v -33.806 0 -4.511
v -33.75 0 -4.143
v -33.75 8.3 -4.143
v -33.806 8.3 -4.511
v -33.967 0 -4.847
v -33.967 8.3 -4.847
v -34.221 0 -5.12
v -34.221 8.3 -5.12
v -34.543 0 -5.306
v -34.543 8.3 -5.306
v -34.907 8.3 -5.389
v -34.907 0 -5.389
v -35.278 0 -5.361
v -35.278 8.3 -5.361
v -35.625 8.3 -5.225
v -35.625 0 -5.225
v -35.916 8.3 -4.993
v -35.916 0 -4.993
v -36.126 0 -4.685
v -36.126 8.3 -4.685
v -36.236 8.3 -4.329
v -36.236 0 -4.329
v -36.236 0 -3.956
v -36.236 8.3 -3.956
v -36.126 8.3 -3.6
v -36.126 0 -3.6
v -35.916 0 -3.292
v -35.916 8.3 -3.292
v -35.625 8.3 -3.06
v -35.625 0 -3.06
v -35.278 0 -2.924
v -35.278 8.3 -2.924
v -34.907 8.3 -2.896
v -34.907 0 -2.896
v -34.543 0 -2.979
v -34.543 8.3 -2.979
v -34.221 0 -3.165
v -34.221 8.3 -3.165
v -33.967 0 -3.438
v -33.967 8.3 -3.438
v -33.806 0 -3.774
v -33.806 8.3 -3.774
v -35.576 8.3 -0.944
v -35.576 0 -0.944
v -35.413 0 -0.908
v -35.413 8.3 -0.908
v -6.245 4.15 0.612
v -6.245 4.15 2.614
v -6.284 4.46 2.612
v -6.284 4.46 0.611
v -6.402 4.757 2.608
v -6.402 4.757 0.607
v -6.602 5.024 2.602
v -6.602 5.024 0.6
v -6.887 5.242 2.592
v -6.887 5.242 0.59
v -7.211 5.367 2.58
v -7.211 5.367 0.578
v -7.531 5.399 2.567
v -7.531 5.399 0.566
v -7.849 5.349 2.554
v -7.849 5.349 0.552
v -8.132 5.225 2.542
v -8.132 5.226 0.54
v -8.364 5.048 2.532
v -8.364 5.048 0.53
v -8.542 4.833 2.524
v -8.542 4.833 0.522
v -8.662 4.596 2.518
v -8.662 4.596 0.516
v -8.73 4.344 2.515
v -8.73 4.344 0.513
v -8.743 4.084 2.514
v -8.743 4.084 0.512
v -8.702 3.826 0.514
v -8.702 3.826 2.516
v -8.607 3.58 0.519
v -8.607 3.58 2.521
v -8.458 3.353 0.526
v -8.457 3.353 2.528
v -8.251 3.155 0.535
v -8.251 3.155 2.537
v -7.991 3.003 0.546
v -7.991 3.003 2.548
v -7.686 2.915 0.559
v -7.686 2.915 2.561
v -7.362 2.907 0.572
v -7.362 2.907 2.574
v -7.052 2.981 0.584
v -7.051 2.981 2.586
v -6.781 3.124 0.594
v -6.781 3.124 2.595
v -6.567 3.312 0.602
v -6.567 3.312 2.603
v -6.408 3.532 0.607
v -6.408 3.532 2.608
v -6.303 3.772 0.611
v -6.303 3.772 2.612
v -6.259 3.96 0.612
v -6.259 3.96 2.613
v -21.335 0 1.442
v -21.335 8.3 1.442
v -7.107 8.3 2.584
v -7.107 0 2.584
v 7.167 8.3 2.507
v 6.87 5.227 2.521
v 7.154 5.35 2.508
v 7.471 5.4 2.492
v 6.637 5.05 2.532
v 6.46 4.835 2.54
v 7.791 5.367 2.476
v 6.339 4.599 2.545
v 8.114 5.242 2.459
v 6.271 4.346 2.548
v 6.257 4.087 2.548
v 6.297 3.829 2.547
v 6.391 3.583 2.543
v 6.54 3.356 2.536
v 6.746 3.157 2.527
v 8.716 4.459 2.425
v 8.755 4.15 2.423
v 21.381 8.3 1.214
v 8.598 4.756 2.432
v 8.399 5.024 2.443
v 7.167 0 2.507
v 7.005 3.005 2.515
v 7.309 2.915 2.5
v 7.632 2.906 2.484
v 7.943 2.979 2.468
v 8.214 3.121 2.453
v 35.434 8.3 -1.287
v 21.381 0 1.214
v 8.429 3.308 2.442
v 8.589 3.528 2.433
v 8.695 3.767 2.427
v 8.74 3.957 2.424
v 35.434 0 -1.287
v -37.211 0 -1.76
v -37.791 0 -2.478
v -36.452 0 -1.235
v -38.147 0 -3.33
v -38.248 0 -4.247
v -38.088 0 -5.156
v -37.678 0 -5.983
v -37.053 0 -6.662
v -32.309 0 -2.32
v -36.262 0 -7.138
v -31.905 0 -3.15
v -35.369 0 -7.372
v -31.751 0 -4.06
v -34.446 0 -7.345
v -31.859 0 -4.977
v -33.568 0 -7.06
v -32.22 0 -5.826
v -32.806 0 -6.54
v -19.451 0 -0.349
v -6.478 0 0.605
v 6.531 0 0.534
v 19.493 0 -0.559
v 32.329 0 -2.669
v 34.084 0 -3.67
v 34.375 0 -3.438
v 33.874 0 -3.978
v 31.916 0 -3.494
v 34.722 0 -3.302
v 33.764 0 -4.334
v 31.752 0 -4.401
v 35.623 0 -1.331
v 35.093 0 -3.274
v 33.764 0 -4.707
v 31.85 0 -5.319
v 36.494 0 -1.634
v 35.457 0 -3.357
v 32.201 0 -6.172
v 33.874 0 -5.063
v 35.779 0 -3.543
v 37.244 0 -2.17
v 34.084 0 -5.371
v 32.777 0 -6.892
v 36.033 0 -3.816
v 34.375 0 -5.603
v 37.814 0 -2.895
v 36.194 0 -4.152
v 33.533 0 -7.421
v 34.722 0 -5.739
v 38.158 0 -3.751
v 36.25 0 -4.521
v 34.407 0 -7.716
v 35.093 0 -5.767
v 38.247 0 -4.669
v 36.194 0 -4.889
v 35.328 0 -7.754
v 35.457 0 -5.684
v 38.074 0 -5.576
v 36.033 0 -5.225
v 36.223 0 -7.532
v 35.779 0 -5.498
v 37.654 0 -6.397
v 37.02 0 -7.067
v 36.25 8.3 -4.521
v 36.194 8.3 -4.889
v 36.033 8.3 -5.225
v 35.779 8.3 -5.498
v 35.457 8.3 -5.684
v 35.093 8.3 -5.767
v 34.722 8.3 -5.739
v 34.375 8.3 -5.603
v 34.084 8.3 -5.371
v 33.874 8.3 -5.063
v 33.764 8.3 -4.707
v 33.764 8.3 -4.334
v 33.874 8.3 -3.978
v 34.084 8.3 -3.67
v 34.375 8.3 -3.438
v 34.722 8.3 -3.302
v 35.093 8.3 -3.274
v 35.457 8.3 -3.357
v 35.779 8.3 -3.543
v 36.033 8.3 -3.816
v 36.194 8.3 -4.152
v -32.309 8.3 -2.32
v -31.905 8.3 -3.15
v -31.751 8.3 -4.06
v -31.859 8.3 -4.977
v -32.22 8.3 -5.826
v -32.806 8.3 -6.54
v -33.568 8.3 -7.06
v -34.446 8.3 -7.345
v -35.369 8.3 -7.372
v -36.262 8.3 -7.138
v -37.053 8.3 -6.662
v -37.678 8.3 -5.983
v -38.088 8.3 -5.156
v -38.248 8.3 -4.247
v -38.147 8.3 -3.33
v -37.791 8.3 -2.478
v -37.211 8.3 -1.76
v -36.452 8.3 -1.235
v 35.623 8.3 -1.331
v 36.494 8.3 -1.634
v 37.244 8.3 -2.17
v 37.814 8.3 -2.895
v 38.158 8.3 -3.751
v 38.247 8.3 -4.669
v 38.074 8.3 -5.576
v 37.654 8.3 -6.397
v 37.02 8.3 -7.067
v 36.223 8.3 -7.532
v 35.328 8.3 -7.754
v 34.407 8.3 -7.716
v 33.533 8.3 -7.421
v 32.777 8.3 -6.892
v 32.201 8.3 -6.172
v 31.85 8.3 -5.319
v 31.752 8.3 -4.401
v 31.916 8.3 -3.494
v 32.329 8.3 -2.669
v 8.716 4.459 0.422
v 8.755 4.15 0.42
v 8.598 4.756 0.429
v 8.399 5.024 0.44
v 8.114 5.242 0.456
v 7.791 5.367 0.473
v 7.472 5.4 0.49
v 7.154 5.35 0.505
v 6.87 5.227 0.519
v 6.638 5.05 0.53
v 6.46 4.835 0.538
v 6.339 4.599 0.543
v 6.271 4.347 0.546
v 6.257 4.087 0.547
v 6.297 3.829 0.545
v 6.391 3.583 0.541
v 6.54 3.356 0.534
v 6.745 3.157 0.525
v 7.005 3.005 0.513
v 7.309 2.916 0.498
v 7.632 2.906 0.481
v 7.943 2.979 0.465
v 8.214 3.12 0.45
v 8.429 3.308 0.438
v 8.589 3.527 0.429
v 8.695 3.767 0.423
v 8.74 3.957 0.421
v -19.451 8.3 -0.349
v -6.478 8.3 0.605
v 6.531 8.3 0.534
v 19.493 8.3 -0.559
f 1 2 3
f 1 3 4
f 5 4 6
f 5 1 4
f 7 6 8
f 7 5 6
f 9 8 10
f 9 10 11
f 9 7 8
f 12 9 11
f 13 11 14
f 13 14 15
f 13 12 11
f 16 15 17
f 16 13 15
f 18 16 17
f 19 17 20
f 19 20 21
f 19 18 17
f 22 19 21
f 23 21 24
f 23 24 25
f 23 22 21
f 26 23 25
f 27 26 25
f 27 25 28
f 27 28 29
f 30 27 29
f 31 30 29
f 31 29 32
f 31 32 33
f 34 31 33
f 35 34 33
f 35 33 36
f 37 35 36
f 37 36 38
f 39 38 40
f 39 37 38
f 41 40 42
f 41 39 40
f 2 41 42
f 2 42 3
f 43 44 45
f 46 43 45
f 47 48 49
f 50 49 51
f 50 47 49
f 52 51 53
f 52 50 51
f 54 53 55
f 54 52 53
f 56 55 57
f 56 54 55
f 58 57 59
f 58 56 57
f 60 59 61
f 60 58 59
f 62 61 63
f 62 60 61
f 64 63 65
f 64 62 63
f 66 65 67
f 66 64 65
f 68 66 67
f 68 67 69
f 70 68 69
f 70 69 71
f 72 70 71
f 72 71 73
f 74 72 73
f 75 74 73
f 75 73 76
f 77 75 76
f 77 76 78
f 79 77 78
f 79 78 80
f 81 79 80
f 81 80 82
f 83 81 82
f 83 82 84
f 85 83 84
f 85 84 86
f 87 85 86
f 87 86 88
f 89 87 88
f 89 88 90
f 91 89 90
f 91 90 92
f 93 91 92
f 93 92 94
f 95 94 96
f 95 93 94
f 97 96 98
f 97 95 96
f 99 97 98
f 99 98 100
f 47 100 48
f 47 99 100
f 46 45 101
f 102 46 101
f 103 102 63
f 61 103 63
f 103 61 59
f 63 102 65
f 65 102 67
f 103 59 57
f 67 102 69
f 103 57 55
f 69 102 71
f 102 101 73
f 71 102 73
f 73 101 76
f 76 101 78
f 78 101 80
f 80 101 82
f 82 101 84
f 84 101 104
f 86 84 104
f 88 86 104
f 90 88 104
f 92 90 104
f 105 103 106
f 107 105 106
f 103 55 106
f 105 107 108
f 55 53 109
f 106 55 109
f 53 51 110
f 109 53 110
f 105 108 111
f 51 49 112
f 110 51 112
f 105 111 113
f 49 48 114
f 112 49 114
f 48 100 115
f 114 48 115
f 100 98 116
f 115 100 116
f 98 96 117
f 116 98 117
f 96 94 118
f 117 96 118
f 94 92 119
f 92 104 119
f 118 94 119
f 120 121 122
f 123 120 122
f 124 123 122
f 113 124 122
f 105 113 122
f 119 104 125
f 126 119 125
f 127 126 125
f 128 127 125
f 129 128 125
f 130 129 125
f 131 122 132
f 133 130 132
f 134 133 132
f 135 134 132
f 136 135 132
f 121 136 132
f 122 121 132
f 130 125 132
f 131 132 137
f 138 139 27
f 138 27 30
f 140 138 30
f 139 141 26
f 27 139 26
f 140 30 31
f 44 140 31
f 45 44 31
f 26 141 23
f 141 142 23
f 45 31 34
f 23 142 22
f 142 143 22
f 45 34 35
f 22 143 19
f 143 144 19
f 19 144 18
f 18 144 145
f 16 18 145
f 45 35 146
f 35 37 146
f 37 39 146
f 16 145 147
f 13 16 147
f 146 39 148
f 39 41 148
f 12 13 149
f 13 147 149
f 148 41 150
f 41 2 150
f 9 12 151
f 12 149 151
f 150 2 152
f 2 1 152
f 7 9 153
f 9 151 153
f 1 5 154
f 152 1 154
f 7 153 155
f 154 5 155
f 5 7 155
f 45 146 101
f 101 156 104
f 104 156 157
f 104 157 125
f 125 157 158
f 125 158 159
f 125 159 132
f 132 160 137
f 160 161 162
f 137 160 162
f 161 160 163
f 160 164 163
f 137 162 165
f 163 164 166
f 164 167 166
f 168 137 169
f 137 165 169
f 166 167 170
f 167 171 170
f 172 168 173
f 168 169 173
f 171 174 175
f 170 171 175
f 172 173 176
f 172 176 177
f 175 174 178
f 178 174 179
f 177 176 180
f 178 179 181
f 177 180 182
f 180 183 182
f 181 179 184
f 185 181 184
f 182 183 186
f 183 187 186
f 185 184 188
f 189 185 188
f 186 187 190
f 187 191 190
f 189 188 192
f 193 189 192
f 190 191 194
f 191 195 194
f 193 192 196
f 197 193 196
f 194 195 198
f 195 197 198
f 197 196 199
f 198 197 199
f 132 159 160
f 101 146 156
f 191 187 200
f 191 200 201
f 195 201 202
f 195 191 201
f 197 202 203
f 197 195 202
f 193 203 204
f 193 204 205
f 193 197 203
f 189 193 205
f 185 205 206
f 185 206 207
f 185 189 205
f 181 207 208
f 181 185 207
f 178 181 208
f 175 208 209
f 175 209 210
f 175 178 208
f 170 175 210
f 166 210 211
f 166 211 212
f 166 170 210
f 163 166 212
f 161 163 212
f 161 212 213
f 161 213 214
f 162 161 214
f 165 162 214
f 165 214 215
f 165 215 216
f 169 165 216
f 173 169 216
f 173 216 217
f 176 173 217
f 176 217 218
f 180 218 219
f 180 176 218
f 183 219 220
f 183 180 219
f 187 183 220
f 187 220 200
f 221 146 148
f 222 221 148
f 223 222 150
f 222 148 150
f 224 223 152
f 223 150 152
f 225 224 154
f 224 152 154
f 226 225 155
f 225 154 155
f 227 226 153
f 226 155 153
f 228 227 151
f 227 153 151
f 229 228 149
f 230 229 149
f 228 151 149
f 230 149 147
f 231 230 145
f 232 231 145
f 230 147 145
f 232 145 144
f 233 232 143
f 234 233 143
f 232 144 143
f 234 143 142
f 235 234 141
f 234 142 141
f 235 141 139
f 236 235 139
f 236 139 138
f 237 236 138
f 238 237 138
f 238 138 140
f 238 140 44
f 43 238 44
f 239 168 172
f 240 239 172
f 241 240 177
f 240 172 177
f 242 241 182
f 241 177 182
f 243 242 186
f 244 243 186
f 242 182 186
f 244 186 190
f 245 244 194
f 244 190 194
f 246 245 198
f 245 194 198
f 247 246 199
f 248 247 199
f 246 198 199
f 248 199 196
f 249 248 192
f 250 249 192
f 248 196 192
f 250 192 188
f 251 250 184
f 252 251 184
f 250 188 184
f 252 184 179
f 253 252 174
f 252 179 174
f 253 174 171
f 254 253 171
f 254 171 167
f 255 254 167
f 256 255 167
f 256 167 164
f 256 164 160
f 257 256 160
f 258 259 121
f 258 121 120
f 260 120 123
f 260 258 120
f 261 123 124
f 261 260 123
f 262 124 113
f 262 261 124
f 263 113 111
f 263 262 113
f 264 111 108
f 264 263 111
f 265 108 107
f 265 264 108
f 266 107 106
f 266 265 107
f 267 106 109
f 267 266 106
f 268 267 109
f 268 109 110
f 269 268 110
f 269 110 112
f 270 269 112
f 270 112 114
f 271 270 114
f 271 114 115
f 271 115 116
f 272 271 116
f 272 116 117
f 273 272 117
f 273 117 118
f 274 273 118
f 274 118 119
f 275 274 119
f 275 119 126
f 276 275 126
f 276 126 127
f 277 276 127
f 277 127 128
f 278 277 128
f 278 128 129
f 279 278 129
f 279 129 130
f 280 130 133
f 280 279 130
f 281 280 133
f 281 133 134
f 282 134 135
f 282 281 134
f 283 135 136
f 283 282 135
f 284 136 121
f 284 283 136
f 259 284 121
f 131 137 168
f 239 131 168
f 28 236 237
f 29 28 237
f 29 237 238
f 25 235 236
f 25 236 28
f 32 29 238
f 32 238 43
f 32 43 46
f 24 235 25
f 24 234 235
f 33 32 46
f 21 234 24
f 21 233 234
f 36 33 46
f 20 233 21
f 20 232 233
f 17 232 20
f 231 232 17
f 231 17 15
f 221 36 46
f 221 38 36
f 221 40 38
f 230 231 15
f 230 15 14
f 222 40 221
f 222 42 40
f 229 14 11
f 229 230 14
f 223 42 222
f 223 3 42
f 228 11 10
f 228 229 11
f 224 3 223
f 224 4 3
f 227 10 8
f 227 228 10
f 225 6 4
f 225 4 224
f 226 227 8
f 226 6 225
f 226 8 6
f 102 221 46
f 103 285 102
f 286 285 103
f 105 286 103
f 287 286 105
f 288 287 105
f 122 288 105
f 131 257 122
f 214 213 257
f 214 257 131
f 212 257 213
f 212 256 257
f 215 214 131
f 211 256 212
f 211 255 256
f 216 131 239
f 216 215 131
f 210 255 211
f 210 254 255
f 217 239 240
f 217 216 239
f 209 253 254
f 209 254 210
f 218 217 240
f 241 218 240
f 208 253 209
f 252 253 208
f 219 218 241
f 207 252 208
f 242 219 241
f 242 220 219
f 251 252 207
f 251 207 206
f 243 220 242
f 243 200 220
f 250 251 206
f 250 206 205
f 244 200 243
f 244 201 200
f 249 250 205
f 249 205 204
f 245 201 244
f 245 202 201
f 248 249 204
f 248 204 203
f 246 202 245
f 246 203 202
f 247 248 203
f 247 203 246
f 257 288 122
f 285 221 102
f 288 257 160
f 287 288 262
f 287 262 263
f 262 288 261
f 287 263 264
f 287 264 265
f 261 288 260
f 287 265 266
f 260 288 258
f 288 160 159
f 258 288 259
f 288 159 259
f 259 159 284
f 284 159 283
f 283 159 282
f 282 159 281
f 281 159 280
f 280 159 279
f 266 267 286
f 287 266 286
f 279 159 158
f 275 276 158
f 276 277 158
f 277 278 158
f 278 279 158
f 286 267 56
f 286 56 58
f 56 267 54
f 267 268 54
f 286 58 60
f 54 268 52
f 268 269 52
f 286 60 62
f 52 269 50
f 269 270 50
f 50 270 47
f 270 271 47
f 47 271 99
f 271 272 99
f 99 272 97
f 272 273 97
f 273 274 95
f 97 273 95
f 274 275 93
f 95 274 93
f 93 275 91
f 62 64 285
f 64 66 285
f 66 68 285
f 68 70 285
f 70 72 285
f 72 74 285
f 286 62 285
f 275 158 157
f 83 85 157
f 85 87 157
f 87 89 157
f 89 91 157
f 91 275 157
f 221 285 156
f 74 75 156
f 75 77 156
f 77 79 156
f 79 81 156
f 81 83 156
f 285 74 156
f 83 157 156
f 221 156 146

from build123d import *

# Parameters (mm, degrees)
SKETCH1_R               = 1.25
BOSS_EXTRUDE1_DEPTH     = 8.3
SKETCH2_R               = 1.25
CUT_EXTRUDE1_DEPTH      = 3.700074126
CUT_EXTRUDE1_DEPTH_BACK = 8.770575704


with BuildPart() as part:
    # Sketch1 → Boss-Extrude1 (new body)
    with BuildSketch(Plane(origin=(0, 0, 0), x_dir=(1, 0, 0), z_dir=(0, 1, 0))):
        with BuildLine():
            Line((35.434172296, 1.287491613), (35.622727971, 1.3307936))
            ThreePointArc((35.622727971, 1.3307936), (36.223294794, 7.531563888), (32.32905872, 2.668935167))
            ThreePointArc((32.32905872, 2.668935167), (0.027157554, -0.697665471), (-32.309217612, 2.319893124))
            ThreePointArc((-32.309217612, 2.319893124), (-36.261610619, 7.13771657), (-35.575715837, 0.943979283))
            Line((-35.575715837, 0.943979283), (-35.413230424, 0.907951956))
            ThreePointArc((-35.413230424, 0.907951956), (0.030803418, -2.69767479), (35.434172296, 1.287491613))
        make_face()
        with Locations((-35, 4.142580739)):
            Circle(SKETCH1_R, mode=Mode.SUBTRACT)
        with Locations((35, 4.520575704)):
            Circle(SKETCH1_R, mode=Mode.SUBTRACT)
    extrude(amount=BOSS_EXTRUDE1_DEPTH)

    # Sketch2 → Cut-Extrude1 (cut, two sides)
    with BuildSketch(Plane.XY) as cut_extrude1_sk:
        with Locations((7.505235468, 4.15)):
            Circle(SKETCH2_R)
        with Locations((-7.494764532, 4.15)):
            Circle(SKETCH2_R)
    extrude(amount=CUT_EXTRUDE1_DEPTH, mode=Mode.SUBTRACT)
    extrude(cut_extrude1_sk.sketch, amount=-CUT_EXTRUDE1_DEPTH_BACK, mode=Mode.SUBTRACT)


solid = part.part
